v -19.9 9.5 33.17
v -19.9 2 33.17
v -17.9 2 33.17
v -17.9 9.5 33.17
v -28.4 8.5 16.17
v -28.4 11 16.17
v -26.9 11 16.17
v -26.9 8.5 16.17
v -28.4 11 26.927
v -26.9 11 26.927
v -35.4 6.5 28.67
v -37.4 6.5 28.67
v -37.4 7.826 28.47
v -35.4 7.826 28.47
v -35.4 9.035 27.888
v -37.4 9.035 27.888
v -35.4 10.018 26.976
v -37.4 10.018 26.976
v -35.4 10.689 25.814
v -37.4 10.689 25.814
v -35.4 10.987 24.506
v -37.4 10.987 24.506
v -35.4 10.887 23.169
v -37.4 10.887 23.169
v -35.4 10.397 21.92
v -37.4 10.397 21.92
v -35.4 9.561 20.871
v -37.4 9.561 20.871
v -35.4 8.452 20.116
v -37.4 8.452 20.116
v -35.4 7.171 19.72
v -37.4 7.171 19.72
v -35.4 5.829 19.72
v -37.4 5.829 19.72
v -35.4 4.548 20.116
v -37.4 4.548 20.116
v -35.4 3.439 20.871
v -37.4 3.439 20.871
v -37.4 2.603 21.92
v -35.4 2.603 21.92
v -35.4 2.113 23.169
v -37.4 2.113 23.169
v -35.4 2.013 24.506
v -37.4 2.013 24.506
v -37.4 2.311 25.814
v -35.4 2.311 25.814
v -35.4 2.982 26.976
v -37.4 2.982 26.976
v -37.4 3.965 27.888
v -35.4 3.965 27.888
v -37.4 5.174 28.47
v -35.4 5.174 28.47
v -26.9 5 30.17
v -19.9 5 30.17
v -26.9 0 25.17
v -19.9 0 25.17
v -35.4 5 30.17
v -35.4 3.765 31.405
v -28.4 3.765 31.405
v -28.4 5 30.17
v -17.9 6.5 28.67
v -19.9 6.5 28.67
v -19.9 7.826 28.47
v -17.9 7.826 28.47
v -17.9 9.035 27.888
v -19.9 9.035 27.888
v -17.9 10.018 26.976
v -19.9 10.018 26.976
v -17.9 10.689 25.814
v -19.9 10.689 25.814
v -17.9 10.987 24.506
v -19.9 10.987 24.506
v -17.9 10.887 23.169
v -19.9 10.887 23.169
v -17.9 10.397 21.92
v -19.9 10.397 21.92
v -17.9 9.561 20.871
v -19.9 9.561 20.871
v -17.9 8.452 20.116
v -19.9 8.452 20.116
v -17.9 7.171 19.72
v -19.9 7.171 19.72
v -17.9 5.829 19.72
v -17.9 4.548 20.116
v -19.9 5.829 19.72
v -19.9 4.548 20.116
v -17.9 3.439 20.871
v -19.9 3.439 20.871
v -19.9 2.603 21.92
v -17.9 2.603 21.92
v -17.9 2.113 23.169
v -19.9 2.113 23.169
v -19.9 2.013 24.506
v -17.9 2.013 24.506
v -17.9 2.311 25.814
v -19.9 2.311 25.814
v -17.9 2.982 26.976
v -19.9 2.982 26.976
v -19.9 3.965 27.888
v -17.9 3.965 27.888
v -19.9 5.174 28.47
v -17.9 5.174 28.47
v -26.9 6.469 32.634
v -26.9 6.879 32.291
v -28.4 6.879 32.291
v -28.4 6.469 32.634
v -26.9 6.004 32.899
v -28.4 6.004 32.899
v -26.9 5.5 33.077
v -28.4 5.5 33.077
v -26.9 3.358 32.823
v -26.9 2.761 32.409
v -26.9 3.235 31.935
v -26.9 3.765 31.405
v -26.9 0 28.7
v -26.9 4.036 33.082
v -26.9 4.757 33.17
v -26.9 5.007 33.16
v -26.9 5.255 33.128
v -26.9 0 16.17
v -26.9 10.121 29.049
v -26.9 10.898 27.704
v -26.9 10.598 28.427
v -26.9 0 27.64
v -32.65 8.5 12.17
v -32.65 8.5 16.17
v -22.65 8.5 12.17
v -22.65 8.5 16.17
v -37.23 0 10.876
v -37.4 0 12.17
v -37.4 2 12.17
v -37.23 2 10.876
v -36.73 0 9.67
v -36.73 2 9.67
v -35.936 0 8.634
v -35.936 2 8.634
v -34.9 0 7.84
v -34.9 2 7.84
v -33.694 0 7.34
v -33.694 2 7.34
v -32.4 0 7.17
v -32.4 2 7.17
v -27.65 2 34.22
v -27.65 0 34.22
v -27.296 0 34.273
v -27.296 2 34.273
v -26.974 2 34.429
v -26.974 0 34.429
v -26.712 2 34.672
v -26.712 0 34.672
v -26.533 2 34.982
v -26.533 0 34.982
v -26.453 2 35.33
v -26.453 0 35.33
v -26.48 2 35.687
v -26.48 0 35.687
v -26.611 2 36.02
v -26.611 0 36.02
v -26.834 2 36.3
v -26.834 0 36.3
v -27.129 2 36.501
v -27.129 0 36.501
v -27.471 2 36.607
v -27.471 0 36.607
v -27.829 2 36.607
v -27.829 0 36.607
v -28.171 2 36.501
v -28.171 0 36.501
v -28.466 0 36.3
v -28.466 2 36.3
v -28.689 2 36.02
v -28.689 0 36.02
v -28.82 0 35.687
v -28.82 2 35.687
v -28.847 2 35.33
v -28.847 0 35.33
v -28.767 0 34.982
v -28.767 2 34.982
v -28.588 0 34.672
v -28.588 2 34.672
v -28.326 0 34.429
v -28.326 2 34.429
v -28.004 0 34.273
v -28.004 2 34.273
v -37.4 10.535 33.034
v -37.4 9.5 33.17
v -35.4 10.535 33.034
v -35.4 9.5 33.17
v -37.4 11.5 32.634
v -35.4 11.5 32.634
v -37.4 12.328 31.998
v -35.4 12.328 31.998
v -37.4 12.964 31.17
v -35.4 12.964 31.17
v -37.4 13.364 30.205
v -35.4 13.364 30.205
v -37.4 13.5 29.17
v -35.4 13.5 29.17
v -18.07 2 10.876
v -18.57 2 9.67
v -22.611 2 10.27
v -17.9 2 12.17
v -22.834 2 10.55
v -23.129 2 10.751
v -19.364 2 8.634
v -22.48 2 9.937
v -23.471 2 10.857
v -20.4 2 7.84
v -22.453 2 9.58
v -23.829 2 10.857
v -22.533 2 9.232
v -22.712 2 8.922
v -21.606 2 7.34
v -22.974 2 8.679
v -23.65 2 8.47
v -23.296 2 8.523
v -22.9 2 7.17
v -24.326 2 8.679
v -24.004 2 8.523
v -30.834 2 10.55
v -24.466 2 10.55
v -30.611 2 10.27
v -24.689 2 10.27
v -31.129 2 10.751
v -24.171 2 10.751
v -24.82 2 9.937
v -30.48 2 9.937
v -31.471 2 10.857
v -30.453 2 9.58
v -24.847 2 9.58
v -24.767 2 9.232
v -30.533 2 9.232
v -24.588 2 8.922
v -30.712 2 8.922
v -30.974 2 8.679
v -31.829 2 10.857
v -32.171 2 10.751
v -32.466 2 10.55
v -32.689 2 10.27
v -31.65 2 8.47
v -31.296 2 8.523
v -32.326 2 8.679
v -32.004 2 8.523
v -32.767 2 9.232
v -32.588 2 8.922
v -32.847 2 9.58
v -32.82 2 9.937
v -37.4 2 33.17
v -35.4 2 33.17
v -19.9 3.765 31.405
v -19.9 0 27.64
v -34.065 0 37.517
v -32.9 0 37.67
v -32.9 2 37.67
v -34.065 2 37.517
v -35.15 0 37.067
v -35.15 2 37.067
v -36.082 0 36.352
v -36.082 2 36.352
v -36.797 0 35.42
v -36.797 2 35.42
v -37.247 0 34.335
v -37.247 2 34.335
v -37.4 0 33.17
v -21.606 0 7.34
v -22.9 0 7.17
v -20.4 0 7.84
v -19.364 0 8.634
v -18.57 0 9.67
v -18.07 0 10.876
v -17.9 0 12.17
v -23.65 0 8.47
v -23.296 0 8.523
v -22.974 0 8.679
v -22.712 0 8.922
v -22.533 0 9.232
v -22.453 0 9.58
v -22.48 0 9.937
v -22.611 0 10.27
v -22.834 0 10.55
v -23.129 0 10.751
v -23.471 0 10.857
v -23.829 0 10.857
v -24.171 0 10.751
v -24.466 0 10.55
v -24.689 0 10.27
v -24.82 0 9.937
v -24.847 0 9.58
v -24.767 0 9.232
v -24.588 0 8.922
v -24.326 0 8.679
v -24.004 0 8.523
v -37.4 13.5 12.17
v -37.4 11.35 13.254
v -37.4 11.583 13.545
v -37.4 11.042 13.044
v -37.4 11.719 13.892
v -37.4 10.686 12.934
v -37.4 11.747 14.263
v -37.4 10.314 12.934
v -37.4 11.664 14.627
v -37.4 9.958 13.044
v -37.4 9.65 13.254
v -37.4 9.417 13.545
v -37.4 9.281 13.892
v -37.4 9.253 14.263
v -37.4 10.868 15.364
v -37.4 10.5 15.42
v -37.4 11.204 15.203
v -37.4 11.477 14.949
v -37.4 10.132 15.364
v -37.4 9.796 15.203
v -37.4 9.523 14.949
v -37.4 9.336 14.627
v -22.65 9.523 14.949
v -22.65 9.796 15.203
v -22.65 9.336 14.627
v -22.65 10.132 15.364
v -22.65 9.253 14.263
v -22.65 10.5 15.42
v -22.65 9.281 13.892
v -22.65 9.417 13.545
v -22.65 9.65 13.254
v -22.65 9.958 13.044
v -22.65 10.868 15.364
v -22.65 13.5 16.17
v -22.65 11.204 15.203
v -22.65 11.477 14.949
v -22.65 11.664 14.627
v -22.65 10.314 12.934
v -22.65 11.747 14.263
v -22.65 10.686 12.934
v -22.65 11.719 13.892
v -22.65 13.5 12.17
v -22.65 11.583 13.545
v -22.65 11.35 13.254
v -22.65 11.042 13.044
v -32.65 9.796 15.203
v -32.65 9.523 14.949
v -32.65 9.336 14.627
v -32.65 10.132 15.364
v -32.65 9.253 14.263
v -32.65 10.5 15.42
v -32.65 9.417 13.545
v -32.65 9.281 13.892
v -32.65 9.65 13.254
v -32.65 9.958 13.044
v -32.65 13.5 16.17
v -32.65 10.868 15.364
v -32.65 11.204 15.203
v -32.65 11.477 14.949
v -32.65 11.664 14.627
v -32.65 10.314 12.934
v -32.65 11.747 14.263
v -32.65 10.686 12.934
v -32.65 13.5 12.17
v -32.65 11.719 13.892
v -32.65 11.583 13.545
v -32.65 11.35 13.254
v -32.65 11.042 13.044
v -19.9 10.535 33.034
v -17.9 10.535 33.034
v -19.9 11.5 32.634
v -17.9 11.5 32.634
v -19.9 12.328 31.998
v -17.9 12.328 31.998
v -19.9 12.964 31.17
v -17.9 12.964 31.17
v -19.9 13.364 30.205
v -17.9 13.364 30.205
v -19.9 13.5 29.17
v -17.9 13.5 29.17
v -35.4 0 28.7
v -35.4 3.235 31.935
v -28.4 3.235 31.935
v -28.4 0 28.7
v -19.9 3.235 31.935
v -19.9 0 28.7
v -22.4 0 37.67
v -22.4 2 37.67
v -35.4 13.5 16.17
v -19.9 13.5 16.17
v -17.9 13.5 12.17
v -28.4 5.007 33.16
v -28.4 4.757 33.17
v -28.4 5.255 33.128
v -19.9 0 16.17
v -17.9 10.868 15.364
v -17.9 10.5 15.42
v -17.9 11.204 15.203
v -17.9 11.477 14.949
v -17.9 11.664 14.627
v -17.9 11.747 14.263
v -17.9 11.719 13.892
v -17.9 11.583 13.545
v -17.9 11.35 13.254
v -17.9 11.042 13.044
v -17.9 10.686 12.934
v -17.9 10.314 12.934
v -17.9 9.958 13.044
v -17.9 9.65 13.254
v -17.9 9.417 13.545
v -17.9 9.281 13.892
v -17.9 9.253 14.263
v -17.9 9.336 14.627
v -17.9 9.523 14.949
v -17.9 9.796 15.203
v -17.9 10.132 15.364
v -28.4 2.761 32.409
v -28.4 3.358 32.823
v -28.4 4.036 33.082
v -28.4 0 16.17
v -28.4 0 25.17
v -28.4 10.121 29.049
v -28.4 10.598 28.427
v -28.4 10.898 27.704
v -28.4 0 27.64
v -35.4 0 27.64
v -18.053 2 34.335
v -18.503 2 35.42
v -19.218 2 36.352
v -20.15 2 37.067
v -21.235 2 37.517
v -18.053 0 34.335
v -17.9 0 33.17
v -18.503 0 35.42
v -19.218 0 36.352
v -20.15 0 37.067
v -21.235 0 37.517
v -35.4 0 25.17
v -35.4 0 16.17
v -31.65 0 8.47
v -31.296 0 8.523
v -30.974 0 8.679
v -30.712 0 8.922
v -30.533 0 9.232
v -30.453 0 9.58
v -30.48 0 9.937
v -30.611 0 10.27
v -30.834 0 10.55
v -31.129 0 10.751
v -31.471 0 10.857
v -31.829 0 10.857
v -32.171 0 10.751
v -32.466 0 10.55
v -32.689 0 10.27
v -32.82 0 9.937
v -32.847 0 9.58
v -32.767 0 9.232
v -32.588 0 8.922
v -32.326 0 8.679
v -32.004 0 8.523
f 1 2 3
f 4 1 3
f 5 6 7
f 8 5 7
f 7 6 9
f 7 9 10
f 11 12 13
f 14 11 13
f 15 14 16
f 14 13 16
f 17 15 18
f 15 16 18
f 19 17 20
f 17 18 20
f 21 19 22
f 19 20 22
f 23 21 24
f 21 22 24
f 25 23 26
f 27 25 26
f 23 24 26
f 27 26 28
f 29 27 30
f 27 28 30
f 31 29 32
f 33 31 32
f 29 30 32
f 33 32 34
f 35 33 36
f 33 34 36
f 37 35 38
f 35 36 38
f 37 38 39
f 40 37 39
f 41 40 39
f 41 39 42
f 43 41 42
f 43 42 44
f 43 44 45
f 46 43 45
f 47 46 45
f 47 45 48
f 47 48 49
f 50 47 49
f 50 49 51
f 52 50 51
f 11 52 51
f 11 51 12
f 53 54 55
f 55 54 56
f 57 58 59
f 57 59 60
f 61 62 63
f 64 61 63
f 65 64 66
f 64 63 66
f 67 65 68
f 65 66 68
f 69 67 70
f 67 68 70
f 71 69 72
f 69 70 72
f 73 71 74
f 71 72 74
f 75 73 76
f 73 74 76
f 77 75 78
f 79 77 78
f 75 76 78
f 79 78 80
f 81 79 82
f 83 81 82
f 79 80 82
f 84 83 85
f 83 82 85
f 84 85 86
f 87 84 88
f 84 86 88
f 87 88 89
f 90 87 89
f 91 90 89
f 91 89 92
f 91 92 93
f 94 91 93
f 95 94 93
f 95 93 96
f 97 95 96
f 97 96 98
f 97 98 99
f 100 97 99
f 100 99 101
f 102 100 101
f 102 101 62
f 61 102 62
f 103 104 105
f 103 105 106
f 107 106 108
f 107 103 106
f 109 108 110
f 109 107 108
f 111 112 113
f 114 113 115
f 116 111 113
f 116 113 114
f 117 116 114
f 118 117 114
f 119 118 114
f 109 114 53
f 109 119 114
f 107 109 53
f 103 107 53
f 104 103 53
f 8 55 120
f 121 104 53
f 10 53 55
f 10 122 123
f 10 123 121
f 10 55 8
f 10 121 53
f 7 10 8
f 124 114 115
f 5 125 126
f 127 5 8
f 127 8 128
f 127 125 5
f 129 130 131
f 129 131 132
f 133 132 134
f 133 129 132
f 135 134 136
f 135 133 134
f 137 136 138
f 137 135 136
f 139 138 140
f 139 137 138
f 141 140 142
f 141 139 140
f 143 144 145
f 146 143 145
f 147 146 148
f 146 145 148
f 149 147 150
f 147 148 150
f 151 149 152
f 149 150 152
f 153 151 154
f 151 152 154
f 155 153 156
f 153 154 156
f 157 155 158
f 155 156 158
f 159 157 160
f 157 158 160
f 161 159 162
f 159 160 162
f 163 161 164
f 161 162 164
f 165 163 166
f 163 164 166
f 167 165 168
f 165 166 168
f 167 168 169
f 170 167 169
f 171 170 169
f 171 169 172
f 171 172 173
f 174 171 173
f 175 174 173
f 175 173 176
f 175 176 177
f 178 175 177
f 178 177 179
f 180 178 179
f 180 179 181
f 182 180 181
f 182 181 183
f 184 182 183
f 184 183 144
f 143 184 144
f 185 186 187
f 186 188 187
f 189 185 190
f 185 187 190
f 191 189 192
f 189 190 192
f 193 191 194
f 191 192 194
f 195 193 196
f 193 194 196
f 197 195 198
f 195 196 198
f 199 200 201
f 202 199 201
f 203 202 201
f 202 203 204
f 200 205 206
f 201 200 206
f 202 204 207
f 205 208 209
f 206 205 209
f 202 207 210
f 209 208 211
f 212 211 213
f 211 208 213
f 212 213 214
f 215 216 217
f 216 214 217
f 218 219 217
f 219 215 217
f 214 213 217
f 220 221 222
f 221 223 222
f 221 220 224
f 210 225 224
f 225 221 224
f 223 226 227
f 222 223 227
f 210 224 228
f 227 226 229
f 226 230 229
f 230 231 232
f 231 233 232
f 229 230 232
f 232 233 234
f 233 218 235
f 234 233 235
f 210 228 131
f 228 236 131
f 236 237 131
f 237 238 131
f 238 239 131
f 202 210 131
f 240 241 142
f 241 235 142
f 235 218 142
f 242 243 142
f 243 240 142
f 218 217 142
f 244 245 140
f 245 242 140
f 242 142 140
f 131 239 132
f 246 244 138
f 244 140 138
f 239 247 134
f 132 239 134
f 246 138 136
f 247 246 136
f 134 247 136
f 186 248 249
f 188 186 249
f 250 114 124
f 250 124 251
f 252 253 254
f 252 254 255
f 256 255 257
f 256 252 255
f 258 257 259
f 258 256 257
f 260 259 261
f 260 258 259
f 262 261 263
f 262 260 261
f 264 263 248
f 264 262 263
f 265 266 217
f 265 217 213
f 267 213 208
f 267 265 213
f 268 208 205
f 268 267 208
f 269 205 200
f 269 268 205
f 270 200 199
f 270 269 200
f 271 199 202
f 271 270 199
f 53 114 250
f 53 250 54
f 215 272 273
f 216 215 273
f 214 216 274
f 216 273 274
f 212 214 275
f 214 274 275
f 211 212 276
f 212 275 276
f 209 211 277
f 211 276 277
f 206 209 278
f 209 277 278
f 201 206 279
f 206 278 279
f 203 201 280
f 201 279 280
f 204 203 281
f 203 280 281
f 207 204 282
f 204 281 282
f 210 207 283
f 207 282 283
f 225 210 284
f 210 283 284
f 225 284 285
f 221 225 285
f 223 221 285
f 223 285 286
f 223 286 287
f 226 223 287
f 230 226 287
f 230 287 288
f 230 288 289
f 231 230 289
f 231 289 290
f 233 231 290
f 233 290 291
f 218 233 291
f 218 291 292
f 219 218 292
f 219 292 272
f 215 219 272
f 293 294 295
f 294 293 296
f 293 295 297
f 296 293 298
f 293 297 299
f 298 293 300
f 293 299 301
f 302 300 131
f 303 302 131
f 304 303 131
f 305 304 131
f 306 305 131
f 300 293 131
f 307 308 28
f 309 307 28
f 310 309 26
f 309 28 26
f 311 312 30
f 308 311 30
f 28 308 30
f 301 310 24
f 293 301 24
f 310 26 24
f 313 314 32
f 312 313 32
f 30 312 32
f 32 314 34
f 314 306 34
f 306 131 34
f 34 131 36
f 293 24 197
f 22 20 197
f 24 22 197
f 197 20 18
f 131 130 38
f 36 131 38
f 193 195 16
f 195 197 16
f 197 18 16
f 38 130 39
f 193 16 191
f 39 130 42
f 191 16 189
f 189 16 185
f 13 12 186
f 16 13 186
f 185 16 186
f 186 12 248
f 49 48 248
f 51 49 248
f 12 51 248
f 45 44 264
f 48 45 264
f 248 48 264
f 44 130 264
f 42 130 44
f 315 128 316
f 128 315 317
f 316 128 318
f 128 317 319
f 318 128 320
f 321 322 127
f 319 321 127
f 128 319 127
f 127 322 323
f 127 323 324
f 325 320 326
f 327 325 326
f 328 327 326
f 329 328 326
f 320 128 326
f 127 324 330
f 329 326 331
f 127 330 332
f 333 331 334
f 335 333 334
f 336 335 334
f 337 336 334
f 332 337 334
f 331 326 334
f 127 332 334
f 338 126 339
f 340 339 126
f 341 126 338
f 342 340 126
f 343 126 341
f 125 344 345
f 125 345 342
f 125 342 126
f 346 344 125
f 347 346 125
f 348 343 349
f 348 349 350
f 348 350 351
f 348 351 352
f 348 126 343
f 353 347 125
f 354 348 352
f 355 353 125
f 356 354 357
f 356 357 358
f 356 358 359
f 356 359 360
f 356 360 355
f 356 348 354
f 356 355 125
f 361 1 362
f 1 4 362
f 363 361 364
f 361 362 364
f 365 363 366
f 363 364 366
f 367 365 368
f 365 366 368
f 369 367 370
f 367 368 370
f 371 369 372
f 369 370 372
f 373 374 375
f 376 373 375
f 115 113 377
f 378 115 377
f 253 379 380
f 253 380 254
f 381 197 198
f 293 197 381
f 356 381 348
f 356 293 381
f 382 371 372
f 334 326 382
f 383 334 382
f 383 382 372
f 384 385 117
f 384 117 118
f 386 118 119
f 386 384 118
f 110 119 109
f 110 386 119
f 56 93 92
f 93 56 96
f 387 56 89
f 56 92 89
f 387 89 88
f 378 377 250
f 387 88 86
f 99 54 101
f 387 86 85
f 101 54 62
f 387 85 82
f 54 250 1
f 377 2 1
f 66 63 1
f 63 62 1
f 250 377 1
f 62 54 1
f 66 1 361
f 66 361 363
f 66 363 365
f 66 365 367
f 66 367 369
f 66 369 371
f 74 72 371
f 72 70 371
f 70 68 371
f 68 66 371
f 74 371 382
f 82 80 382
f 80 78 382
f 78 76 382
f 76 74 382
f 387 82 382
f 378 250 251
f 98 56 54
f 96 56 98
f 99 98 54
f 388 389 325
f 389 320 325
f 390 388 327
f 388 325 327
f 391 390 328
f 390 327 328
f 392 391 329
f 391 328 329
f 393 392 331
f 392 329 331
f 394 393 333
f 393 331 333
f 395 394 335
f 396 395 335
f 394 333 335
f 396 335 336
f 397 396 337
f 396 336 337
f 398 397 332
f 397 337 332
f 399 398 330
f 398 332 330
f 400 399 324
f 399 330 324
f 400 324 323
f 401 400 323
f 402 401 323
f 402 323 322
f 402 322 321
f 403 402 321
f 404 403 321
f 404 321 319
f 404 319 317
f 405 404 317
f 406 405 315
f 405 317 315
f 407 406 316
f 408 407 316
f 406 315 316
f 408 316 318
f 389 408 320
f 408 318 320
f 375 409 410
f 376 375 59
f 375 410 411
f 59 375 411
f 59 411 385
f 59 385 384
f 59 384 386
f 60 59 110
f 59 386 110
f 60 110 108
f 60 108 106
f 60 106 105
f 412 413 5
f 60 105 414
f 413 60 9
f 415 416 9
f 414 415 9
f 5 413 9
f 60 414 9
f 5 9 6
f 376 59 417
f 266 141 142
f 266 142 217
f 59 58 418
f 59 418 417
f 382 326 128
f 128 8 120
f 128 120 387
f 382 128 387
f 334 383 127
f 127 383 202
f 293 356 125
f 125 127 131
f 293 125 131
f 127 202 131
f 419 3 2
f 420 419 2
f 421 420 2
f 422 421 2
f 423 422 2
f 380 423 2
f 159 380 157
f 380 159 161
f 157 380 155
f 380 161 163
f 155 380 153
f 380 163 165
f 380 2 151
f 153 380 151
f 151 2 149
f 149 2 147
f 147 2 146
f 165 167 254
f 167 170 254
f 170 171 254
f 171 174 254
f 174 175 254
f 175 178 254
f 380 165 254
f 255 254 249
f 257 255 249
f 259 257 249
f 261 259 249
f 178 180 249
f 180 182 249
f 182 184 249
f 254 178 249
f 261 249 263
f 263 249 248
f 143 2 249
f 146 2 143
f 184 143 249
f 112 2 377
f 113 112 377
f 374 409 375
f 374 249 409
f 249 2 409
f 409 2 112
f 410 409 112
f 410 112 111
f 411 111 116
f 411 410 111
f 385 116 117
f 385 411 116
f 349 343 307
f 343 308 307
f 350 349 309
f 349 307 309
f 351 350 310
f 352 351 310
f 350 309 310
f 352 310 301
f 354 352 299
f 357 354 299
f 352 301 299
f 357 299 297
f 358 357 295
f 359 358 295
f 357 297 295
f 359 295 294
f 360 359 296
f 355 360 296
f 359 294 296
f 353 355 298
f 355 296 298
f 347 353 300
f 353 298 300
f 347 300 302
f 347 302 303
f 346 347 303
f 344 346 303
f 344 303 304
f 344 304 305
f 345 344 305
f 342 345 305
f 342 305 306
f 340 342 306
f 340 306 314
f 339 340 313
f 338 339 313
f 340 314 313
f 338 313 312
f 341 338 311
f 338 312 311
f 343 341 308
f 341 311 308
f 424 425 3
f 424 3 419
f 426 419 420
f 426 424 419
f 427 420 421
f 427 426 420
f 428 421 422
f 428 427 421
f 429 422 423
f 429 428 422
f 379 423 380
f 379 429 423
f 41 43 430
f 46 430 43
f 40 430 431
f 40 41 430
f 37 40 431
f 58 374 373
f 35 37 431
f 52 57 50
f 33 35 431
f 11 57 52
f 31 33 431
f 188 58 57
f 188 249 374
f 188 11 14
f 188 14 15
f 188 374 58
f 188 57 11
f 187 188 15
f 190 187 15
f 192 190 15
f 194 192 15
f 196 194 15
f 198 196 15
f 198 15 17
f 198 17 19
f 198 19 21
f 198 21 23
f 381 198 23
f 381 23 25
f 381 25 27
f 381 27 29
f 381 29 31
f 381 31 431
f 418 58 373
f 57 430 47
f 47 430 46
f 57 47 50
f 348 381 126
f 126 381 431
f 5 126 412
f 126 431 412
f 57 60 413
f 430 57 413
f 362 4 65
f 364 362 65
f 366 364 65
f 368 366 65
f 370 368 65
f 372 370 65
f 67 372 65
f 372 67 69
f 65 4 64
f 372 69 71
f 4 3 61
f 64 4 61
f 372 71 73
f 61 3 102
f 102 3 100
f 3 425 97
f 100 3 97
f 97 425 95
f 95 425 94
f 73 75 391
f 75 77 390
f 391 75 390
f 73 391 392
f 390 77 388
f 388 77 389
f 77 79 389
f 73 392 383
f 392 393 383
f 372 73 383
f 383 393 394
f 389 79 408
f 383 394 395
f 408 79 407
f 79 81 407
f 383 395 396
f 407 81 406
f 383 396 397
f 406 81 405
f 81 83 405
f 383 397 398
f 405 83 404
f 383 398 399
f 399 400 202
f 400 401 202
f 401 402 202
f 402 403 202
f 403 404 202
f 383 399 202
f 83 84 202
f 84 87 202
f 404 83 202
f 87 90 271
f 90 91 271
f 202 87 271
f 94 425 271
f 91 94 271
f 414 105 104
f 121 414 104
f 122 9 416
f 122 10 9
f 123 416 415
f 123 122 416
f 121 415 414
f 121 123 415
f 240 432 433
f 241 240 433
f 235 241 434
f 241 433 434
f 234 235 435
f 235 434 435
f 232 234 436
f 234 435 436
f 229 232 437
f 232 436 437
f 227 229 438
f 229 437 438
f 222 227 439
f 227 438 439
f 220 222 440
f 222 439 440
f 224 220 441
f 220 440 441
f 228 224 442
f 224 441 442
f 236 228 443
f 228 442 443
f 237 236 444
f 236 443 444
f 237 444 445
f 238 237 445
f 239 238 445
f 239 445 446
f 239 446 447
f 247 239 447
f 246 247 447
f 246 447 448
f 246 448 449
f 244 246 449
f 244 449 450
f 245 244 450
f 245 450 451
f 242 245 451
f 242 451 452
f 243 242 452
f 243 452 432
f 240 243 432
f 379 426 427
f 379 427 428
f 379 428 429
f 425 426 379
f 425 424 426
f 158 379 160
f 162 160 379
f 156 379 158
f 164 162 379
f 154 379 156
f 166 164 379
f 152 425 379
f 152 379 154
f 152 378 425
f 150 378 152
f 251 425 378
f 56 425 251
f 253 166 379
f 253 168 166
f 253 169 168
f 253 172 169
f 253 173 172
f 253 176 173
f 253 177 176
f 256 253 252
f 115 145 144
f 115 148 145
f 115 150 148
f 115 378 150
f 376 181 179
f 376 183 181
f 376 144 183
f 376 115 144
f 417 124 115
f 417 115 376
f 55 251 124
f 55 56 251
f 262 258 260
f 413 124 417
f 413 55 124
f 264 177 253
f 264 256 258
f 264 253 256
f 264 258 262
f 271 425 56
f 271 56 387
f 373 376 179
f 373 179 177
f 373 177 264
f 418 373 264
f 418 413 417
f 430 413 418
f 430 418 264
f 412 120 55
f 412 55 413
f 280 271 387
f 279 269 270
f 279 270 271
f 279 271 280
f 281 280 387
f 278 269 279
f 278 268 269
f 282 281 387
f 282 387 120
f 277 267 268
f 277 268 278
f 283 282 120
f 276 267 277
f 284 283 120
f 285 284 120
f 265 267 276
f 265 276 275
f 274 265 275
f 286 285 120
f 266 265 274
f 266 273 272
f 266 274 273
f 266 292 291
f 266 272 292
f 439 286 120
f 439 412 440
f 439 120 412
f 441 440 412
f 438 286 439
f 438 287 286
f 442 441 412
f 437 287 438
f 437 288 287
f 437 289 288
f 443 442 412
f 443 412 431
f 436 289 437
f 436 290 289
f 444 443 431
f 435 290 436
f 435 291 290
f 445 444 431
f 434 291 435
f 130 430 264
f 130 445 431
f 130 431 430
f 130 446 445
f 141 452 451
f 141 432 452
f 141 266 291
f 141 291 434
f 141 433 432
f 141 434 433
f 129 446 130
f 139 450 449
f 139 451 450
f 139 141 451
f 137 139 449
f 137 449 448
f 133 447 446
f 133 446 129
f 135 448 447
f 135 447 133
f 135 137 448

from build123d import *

# Parameters (mm, degrees)
BOSS_EXTRUDE7_DEPTH  = 13.5
SKETCH22_R           = 4.5
CUT_EXTRUDE4_DEPTH   = 41.776818177
SKETCH9_W            = 1.5
SKETCH9_H            = 17
BOSS_EXTRUDE8_DEPTH  = 11
BOSS_EXTRUDE9_DEPTH  = 2
FILLET1_R            = 4
SKETCH11_W           = 10
SKETCH11_H           = 4
CUT_EXTRUDE1_DEPTH   = 5
CHAMFER2_SIZE        = 5
FILLET2_R            = 3
SKETCH12_R           = 1.25
CUT_EXTRUDE2_DEPTH   = 12.5
M2_CLEARANCE_HOLE1_D = 2.4
BOSS_EXTRUDE10_DEPTH = 2
M2_CLEARANCE_HOLE2_D = 2.4
SKETCH20_W           = 15.5
SKETCH20_H           = 8
BOSS_EXTRUDE11_DEPTH = 5.5
CHAMFER3_SIZE        = 5.5
CHAMFER4_START       = -35.400000065
CHAMFER4_DEPTH       = 7
CHAMFER4_START_2     = -26.900000065
CHAMFER4_2_DEPTH     = 7
CHAMFER4_START_3     = -28.400000065
CHAMFER4_3_DEPTH     = 1.5
SKETCH21_W           = 7
SKETCH21_H           = 0.75
CUT_EXTRUDE3_DEPTH   = 46.949966868
LPATTERN1_COUNT      = 2
LPATTERN1_PITCH      = 8.5


with BuildPart() as part:
    # Sketch8 → Boss-Extrude7 (new body)
    with BuildSketch(Plane(origin=(0, 0, 0), x_dir=(1, 0, 0), z_dir=(0, 1, 0))):
        Polygon((-37.400000065, -12.17000001), (-37.400000065, -33.17000001), (-35.400000065, -33.17000001), (-35.400000065, -16.17000001), (-19.900000065, -16.17000001), (-19.900000065, -33.17000001), (-17.900000065, -33.17000001), (-17.900000065, -12.17000001), align=None)
    extrude(amount=BOSS_EXTRUDE7_DEPTH)

    # Sketch22 → Cut-Extrude4 (cut, through all)
    with BuildSketch(Plane.ZY.offset(37.400000065)):
        with Locations((24.17000001, 6.5)):
            Circle(SKETCH22_R)
    extrude(amount=-CUT_EXTRUDE4_DEPTH, mode=Mode.SUBTRACT)

    # Sketch9 → Boss-Extrude8 (add)
    with BuildSketch(Plane(origin=(0, 0, 0), x_dir=(1, 0, 0), z_dir=(0, 1, 0))):
        with Locations((-27.650000065, -24.67000001)):
            Rectangle(SKETCH9_W, SKETCH9_H)
    extrude(amount=BOSS_EXTRUDE8_DEPTH)

    # Sketch10 → Boss-Extrude9 (add)
    with BuildSketch(Plane(origin=(0, 0, 0), x_dir=(1, 0, 0), z_dir=(0, 1, 0))):
        with BuildLine():
            Line((-37.400000065, -30.17000001), (-17.900000065, -30.17000001))
            Line((-17.900000065, -30.17000001), (-17.900000065, -33.17000001))
            ThreePointArc((-17.900000065, -33.17000001), (-19.218019549, -36.351980525), (-22.400000065, -37.67000001))
            Line((-22.400000065, -37.67000001), (-32.900000065, -37.67000001))
            ThreePointArc((-32.900000065, -37.67000001), (-36.08198058, -36.351980525), (-37.400000065, -33.17000001))
            Line((-37.400000065, -33.17000001), (-37.400000065, -30.17000001))
        make_face()
    extrude(amount=BOSS_EXTRUDE9_DEPTH)

    # Fillet1
    fillet1_edges = [part.edges().sort_by_distance(p)[0] for p in [
        (-36.400000065, 13.5, 33.17000001),
        (-18.900000065, 13.5, 33.17000001),
    ]]
    fillet(fillet1_edges, radius=FILLET1_R)

    # Sketch11 → Cut-Extrude1 (cut)
    with BuildSketch(Plane(origin=(0, 13.5, 0), x_dir=(1, 0, 0), z_dir=(0, 1, 0))):
        with Locations((-27.650000065, -14.17000001)):
            Rectangle(SKETCH11_W, SKETCH11_H)
    extrude(amount=-CUT_EXTRUDE1_DEPTH, mode=Mode.SUBTRACT)

    # Chamfer2
    chamfer2_edges = [part.edges().sort_by_distance(p)[0] for p in [
        (-27.650000065, 11, 33.17000001),
    ]]
    chamfer(chamfer2_edges, length=CHAMFER2_SIZE)

    # Fillet2
    fillet2_edges = [part.edges().sort_by_distance(p)[0] for p in [
        (-27.650000065, 11, 28.17000001),
        (-27.650000065, 6, 33.17000001),
    ]]
    fillet(fillet2_edges, radius=FILLET2_R)

    # Sketch12 → Cut-Extrude2 (cut, symmetric)
    with BuildSketch(Plane.ZY.offset(27.650000065)):
        with Locations((14.17000001, 10.5)):
            Circle(SKETCH12_R)
    extrude(amount=CUT_EXTRUDE2_DEPTH, both=True, mode=Mode.SUBTRACT)

    # M2 Clearance Hole1 (through all)
    with Locations(Plane(origin=(-27.650000065, 2, 35.42000001), x_dir=(0, 0, 1), z_dir=(0, 1, 0))):
        with Locations((0, 0)):
            Hole(M2_CLEARANCE_HOLE1_D / 2)

    # Sketch17 → Boss-Extrude10 (add)
    with BuildSketch(Plane(origin=(0, 0, 0), x_dir=(1, 0, 0), z_dir=(0, 1, 0))):
        with BuildLine():
            Line((-32.400000065, -7.17000001), (-22.900000065, -7.17000001))
            ThreePointArc((-22.900000065, -7.17000001), (-19.364466159, -8.634466104), (-17.900000065, -12.17000001))
            Line((-17.900000065, -12.17000001), (-17.900000065, -14.17000001))
            Line((-17.900000065, -14.17000001), (-37.400000065, -14.17000001))
            Line((-37.400000065, -14.17000001), (-37.400000065, -12.17000001))
            ThreePointArc((-37.400000065, -12.17000001), (-35.935533971, -8.634466104), (-32.400000065, -7.17000001))
        make_face()
    extrude(amount=BOSS_EXTRUDE10_DEPTH)

    # M2 Clearance Hole2 (through all)
    with Locations(Plane(origin=(-31.650000065, 2, 9.67000001), x_dir=(0, 0, 1), z_dir=(0, 1, 0))):
        with Locations((0, 0), (0, 8)):
            Hole(M2_CLEARANCE_HOLE2_D / 2)

    # Sketch20 → Boss-Extrude11 (add)
    with BuildSketch(Plane(origin=(0, 0, 0), x_dir=(1, 0, 0), z_dir=(0, 1, 0))):
        with Locations((-27.650000065, -29.17000001)):
            Rectangle(SKETCH20_W, SKETCH20_H)
    extrude(amount=BOSS_EXTRUDE11_DEPTH)

    # Chamfer3
    # the kernel refuses this chamfer: 5.5 mm, written as the material it takes off along each edge
    with BuildSketch(Plane(origin=(-14.255743631, 5.5, 25.17000001), x_dir=(0, 0, 1), z_dir=(-1, 0, 0))) as chamfer3_piece_1_section:
        Polygon((CHAMFER3_SIZE, 0), (0, -CHAMFER3_SIZE), (0, 0), align=None)
    chamfer3_piece_1 = extrude(amount=35.288512868, mode=Mode.PRIVATE)
    chamfer3_piece_1 = split(chamfer3_piece_1, bisect_by=Plane(origin=(-26.900000065, 5.5, 25.17000001), z_dir=(1, 0, 0)), keep=Keep.TOP, mode=Mode.PRIVATE)
    chamfer3_piece_1 = split(chamfer3_piece_1, bisect_by=Plane(origin=(-19.900000065, 5.5, 25.17000001), z_dir=(-1, 0, 0)), keep=Keep.TOP, mode=Mode.PRIVATE)
    add(chamfer3_piece_1, mode=Mode.SUBTRACT)
    with BuildSketch(Plane(origin=(-28.400000065, 5.5, 25.17000001), x_dir=(0, 0, 1), z_dir=(-1, 0, 0)), Plane(origin=(-19.900000065, 5.5, 25.17000001), x_dir=(0, 0, 1), z_dir=(-1, 0, 0))) as chamfer3_piece_2:
        Polygon((CHAMFER3_SIZE, 0), (0, -CHAMFER3_SIZE), (0, 0), align=None)
    extrude(amount=7, mode=Mode.SUBTRACT)
    with BuildSketch(Plane(origin=(-5.755743631, 5.5, 25.17000001), x_dir=(0, 0, 1), z_dir=(-1, 0, 0))) as chamfer3_piece_3_section:
        Polygon((CHAMFER3_SIZE, 0), (0, -CHAMFER3_SIZE), (0, 0), align=None)
    chamfer3_piece_3 = extrude(amount=35.288512868, mode=Mode.PRIVATE)
    chamfer3_piece_3 = split(chamfer3_piece_3, bisect_by=Plane(origin=(-28.400000065, 5.5, 25.17000001), z_dir=(-1, 0, 0)), keep=Keep.TOP, mode=Mode.PRIVATE)
    chamfer3_piece_3 = split(chamfer3_piece_3, bisect_by=Plane(origin=(-35.400000065, 5.5, 25.17000001), z_dir=(1, 0, 0)), keep=Keep.TOP, mode=Mode.PRIVATE)
    add(chamfer3_piece_3, mode=Mode.SUBTRACT)

    # Chamfer4: read off the stored shape, not the designer's step
    # Chamfer4 outline → Chamfer4 (cut)
    with BuildSketch(Plane.YZ.offset(CHAMFER4_START)):
        Polygon((5.5, 30.67000001), (5.5, 33.17000001), (2, 33.17000001), (5, 30.17000001), align=None)
    extrude(amount=CHAMFER4_DEPTH, mode=Mode.SUBTRACT)

    # Chamfer4 2 outline → Chamfer4 2 (cut)
    with BuildSketch(Plane.YZ.offset(CHAMFER4_START_2)):
        Polygon((5.5, 30.67000001), (5.5, 33.17000001), (2, 33.17000001), (5, 30.17000001), align=None)
    extrude(amount=CHAMFER4_2_DEPTH, mode=Mode.SUBTRACT)

    # Chamfer4 3 outline → Chamfer4 3 (cut)
    with BuildSketch(Plane.YZ.offset(CHAMFER4_START_3)):
        with BuildLine():
            ThreePointArc((4.757359313, 33.17000001), (5.131603073, 33.146565415), (5.5, 33.076627748))
            Line((5.5, 33.076627748), (5.5, 33.17000001))
            Line((5.5, 33.17000001), (4.757359313, 33.17000001))
        make_face()
        with BuildLine():
            ThreePointArc((2.760831368, 32.409168642), (3.689067662, 32.973346751), (4.757359313, 33.17000001))
            Line((4.757359313, 33.17000001), (2, 33.17000001))
            Line((2, 33.17000001), (2.760831368, 32.409168642))
        make_face()
    extrude(amount=CHAMFER4_3_DEPTH, mode=Mode.SUBTRACT)

    # Sketch21 → Cut-Extrude3 (cut, through all)
    with BuildSketch(Plane(origin=(0, 17.585000005, 17.585000005), x_dir=(1, 0, 0), z_dir=(0, 0.7071067811865511, 0.707106781186544))):
        with Locations((-31.900000065, -19.919198033)):
            Rectangle(SKETCH21_W, SKETCH21_H)
    cut_extrude3 = extrude(amount=-CUT_EXTRUDE3_DEPTH, mode=Mode.SUBTRACT)

    # LPattern1: Cut-Extrude3 ×2
    with Locations(*[(i * LPATTERN1_PITCH, 0, 0) for i in range(1, LPATTERN1_COUNT)]):
        add(cut_extrude3, mode=Mode.SUBTRACT)


solid = part.part
